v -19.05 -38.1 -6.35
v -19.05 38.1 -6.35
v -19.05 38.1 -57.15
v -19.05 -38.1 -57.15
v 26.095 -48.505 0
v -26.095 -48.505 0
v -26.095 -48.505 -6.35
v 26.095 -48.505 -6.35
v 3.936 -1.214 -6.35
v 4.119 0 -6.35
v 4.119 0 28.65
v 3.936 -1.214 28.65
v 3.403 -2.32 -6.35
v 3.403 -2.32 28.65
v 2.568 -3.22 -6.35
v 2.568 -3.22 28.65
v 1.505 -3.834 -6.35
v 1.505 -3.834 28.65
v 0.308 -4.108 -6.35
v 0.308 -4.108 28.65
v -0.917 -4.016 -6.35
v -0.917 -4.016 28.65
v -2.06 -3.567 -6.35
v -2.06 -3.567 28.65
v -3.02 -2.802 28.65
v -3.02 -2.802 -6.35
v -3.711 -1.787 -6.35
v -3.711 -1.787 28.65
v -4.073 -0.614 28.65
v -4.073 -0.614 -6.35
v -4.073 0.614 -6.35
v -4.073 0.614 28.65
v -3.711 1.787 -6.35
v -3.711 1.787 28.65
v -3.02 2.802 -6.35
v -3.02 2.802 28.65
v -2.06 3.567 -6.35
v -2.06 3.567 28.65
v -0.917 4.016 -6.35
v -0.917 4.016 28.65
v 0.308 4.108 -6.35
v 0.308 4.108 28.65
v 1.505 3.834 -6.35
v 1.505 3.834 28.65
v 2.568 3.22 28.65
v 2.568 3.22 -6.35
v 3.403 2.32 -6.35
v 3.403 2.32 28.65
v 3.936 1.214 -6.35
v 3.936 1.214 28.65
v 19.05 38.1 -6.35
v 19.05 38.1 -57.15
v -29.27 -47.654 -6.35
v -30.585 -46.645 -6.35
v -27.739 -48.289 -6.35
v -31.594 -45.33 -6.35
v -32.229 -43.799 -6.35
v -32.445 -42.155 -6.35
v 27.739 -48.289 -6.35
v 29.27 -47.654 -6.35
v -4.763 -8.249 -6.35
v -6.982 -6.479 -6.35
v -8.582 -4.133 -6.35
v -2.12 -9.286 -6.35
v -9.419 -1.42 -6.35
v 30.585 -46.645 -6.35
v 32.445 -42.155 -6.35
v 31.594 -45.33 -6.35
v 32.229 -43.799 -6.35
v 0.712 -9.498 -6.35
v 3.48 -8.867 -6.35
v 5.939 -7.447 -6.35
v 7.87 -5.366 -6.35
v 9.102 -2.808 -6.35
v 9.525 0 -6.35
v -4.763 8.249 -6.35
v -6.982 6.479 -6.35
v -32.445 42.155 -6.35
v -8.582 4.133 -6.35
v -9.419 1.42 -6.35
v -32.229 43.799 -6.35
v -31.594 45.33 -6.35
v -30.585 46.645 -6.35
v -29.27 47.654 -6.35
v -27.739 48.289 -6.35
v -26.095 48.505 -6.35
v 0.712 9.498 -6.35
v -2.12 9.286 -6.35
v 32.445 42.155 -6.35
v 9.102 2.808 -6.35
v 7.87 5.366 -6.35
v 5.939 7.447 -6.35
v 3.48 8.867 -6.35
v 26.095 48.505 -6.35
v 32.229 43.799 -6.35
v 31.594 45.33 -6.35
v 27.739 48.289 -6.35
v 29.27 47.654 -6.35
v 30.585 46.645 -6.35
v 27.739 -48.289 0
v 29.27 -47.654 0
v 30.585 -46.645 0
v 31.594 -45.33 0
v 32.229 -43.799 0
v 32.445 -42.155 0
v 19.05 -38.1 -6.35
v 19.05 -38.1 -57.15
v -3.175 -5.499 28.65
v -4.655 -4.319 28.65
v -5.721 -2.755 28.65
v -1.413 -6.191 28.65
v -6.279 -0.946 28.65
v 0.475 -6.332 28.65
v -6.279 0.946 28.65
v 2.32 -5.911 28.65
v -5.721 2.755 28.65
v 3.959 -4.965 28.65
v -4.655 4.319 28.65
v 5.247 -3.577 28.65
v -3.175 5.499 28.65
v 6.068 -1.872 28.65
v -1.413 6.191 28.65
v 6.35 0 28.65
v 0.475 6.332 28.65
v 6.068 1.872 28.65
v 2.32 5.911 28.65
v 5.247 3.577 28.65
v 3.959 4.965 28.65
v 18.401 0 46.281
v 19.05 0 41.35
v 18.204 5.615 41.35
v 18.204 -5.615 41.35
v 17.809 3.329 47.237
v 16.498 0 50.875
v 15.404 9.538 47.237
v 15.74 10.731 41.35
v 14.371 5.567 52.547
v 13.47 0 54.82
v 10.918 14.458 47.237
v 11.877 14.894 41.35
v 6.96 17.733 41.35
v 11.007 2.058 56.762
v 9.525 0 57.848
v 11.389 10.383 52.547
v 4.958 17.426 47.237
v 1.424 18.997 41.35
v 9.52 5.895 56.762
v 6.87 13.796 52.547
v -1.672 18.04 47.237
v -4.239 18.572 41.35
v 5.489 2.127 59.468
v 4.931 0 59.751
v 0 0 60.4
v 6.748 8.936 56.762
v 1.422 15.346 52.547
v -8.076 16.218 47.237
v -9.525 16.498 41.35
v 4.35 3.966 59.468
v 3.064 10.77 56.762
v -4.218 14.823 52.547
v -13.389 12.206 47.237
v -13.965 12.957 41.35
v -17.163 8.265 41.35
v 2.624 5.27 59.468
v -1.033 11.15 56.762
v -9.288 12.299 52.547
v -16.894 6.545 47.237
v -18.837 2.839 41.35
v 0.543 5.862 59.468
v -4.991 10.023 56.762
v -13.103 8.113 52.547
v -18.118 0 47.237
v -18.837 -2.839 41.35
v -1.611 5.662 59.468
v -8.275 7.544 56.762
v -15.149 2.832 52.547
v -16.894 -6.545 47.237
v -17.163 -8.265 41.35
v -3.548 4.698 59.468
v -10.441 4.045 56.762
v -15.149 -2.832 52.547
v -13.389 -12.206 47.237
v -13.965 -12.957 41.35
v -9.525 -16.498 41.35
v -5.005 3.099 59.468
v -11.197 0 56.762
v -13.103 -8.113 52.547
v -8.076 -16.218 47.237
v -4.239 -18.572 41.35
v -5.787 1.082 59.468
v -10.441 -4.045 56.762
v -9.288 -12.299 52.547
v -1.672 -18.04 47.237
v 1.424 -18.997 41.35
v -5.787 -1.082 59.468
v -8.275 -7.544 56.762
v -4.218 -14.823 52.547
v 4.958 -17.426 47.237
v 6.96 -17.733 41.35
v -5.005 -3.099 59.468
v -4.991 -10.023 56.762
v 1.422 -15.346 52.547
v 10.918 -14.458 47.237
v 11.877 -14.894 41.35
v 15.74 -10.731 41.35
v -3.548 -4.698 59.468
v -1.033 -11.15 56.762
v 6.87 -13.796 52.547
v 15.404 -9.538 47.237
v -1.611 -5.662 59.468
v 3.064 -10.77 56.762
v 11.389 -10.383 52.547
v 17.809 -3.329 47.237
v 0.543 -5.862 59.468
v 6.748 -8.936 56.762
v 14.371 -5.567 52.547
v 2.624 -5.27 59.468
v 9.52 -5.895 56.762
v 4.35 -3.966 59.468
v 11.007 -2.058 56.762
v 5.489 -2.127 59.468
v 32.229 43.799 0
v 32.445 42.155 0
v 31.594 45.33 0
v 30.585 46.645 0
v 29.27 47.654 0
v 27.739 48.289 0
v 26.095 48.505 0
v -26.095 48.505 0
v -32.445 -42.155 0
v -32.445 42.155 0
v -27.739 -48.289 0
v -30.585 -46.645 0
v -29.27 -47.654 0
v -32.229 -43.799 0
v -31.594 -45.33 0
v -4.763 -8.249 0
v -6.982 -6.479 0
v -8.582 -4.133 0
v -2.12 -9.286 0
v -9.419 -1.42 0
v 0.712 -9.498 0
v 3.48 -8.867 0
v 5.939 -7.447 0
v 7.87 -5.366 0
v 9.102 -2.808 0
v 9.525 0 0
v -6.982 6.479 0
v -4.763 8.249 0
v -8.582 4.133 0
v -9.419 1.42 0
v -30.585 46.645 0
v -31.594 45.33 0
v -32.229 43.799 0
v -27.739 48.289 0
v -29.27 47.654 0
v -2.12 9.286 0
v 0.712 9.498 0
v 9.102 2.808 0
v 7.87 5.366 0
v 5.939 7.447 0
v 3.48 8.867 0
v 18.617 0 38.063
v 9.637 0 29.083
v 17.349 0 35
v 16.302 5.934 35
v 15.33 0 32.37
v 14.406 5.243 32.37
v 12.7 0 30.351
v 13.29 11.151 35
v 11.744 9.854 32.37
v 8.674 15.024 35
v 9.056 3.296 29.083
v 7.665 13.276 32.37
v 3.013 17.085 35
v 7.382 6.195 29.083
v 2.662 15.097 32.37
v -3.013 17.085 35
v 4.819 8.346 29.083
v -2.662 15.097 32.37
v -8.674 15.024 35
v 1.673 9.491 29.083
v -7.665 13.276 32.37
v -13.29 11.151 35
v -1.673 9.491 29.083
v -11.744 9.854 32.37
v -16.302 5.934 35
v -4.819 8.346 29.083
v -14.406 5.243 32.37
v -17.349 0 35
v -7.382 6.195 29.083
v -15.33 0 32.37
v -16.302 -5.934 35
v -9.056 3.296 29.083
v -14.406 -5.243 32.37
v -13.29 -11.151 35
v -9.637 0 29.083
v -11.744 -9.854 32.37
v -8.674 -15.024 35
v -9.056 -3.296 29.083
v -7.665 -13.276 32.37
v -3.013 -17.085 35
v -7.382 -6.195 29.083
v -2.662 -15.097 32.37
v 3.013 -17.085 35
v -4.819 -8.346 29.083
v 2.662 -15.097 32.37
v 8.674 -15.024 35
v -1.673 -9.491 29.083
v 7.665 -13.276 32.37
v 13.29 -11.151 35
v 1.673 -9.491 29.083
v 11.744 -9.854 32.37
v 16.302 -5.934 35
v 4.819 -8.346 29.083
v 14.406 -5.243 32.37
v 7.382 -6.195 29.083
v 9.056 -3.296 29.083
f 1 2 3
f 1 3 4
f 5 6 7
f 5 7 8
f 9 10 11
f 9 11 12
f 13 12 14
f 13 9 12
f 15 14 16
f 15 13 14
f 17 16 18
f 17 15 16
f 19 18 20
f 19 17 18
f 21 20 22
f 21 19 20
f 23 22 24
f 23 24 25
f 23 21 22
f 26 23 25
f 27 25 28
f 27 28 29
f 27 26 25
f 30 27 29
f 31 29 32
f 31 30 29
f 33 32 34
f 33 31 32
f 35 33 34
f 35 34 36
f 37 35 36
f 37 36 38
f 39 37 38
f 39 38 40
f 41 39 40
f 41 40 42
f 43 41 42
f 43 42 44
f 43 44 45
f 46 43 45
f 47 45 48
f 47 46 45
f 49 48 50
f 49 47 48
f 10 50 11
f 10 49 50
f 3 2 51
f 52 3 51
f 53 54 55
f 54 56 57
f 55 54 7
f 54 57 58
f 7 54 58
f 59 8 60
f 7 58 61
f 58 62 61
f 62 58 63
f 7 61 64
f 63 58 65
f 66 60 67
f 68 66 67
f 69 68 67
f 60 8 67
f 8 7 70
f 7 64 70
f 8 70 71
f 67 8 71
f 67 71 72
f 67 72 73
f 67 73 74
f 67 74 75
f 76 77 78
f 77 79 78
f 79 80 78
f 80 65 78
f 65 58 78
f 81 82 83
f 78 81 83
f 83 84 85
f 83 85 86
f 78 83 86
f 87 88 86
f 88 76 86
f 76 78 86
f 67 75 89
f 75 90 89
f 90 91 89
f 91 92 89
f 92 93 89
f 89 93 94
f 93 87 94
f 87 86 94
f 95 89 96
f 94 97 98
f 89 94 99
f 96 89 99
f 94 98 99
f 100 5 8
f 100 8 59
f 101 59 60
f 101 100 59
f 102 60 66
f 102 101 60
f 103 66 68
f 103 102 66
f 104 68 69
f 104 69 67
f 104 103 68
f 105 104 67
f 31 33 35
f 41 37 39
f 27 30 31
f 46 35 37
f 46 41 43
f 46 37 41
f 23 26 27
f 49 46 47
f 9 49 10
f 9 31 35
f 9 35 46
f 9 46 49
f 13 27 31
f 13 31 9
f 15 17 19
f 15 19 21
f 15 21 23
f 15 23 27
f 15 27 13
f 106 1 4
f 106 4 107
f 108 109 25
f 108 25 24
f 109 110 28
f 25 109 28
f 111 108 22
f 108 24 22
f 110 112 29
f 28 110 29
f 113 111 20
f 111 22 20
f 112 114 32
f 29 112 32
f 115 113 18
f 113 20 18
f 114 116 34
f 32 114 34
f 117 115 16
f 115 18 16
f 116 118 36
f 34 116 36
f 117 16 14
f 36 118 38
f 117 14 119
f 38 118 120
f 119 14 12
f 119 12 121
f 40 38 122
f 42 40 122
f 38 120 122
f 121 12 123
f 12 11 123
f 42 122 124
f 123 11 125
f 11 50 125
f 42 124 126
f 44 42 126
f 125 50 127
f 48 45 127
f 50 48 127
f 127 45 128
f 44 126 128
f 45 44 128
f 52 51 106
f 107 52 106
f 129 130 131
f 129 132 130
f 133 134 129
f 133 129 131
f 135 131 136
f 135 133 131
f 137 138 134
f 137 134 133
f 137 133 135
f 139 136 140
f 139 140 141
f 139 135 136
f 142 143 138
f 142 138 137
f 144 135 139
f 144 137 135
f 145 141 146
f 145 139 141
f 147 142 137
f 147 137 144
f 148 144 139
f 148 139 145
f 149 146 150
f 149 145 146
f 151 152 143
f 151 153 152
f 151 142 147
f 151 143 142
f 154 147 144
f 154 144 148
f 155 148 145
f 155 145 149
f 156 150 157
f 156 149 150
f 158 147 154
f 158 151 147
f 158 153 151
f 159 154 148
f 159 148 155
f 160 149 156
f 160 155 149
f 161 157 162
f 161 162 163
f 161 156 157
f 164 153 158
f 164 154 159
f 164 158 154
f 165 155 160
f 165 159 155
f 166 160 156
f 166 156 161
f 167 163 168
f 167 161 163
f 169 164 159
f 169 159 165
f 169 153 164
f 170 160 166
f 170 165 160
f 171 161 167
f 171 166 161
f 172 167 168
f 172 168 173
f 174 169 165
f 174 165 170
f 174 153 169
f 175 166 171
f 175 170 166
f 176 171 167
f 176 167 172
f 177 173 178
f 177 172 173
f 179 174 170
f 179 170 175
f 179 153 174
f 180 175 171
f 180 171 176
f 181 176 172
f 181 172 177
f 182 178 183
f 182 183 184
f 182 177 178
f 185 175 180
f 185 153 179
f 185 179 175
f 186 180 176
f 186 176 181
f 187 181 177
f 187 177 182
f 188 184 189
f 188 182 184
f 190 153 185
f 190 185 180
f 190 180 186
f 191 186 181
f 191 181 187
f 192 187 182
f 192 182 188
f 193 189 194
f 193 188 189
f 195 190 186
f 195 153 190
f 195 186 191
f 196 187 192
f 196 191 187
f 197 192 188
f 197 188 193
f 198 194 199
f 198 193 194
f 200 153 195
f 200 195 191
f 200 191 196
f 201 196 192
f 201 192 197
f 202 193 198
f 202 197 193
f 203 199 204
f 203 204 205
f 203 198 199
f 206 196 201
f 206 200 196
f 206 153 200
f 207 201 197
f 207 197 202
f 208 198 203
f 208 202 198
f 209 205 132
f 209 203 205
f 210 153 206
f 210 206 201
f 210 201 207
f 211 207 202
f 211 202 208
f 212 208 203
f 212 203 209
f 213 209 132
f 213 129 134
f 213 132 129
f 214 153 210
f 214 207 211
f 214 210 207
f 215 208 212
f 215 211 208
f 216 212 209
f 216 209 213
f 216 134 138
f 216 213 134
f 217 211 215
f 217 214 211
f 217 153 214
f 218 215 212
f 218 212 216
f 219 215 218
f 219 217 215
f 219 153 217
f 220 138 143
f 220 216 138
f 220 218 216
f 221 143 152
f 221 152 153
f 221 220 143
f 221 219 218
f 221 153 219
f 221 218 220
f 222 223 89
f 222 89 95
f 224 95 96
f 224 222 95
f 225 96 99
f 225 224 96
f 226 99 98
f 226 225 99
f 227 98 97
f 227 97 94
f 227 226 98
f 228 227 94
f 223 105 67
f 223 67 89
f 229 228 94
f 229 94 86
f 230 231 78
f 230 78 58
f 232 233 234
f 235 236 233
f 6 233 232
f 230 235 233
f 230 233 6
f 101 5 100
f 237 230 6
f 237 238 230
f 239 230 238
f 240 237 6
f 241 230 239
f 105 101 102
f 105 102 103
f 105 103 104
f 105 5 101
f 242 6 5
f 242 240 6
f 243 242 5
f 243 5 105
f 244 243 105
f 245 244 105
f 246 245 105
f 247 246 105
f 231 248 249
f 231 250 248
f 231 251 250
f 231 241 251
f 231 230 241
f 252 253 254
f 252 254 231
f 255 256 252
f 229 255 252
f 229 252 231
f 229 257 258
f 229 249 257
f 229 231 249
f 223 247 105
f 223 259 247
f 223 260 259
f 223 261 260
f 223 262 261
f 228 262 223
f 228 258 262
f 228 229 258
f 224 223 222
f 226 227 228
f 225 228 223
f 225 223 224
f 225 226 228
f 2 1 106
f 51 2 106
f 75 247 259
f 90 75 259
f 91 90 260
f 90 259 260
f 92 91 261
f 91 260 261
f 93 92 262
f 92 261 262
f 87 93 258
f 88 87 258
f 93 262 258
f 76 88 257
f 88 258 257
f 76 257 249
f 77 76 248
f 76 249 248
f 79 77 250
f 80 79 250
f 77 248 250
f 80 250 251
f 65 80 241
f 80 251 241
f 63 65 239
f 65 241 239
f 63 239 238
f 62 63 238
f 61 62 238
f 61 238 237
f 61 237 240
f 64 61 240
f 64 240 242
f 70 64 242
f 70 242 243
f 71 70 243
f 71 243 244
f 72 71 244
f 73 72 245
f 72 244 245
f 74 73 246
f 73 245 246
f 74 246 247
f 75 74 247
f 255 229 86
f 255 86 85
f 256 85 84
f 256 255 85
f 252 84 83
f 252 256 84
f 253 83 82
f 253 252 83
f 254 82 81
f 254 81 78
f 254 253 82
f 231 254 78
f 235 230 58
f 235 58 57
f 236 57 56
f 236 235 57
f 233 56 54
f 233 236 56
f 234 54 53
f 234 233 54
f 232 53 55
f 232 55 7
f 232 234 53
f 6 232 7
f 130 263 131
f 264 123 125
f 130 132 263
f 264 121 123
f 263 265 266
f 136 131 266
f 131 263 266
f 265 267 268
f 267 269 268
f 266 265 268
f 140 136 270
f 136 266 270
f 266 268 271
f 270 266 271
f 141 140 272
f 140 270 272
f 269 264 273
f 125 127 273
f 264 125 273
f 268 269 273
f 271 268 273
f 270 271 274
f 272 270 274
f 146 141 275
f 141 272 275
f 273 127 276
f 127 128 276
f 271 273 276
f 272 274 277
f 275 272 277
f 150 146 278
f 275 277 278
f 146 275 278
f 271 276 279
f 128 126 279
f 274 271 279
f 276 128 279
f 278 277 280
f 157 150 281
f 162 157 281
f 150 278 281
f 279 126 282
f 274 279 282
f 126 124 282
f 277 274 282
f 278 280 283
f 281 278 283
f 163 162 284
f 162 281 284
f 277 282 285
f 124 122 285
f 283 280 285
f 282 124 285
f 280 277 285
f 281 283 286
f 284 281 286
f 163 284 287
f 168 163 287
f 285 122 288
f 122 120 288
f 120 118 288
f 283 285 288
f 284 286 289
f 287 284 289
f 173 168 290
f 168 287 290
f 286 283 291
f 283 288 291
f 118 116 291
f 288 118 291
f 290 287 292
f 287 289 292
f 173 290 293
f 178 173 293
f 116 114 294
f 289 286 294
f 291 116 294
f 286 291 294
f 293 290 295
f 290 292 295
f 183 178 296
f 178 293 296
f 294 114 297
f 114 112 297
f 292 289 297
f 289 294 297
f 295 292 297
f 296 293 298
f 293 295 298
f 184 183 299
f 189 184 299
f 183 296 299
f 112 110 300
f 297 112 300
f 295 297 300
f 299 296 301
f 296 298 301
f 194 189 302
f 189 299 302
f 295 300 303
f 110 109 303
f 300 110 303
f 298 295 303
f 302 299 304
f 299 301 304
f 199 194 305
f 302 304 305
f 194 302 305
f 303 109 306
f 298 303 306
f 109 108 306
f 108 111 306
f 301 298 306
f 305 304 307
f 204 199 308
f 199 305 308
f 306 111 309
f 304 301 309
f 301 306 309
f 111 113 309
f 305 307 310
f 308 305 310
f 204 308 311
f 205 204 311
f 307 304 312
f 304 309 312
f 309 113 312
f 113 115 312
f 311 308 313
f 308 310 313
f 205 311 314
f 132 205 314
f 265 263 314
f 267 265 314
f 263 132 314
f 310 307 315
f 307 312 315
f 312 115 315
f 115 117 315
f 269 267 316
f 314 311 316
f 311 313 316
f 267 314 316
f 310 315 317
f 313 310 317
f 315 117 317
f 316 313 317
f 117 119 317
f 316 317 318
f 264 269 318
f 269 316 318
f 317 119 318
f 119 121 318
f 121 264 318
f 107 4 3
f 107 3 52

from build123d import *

# Parameters (mm, degrees)
F0_R     = 9.525
F1_DEPTH = 6.35
F2_R     = 4.1191118401
F3_DEPTH = 35
F4_R     = 19.05
F5_DEPTH = 31.75
F6_R     = 19.05
F7_R     = 12.69999
F8_W     = 38.1
F8_H     = 76.2
F8_R     = 9.525
F9_DEPTH = 50.8


# Not quite as in the source:
# - a fillet or chamfer is up to 0.001 mm smaller than in the source, because OpenCascade refuses the exact size


with BuildPart() as f1:
    # F0 (on Top) → F1 (new body)
    with BuildSketch(Plane.XY):
        with BuildLine():
            Line((26.095, 48.505), (-26.095, 48.505))
            ThreePointArc((-26.095, 48.505), (-30.5851280605, 46.6451280605), (-32.445, 42.155))
            Line((-32.445, 42.155), (-32.445, -42.155))
            ThreePointArc((-32.445, -42.155), (-30.5851280605, -46.6451280605), (-26.095, -48.505))
            Line((-26.095, -48.505), (26.095, -48.505))
            ThreePointArc((26.095, -48.505), (30.5851280605, -46.6451280605), (32.445, -42.155))
            Line((32.445, -42.155), (32.445, 42.155))
            ThreePointArc((32.445, 42.155), (30.5851280605, 46.6451280605), (26.095, 48.505))
        make_face()
        Circle(F0_R, mode=Mode.SUBTRACT)
    extrude(amount=-F1_DEPTH)


with BuildPart() as f3:
    # F2 (on face) → F3 (new body)
    with BuildSketch(Plane(origin=(0, 0, -6.35), x_dir=(1, 0, 0), z_dir=(0, 0, -1))):
        Circle(F2_R)
    extrude(amount=-F3_DEPTH)

    # F4 (on face) → F5 (join)
    with BuildSketch(Plane.XY.offset(28.65)):
        Circle(F4_R)
    extrude(amount=F5_DEPTH)

    # F6
    f6_edges = [f3.edges().sort_by_distance(p)[0] for p in [
        (-19.05, 0, 60.4),
    ]]
    fillet(f6_edges, radius=F6_R)

    # F7 (radius 12.7 in the source; OpenCascade refuses exactly that, so slightly less here)
    f7_edges = [f3.edges().sort_by_distance(p)[0] for p in [
        (-19.05, 0, 28.65),
    ]]
    fillet(f7_edges, radius=F7_R)


with BuildPart() as f9:
    # F8 (on face) → F9 (new body)
    with BuildSketch(Plane(origin=(0, 0, -6.35), x_dir=(1, 0, 0), z_dir=(0, 0, -1))):
        Rectangle(F8_W, F8_H)
        Circle(F8_R, mode=Mode.SUBTRACT)
        Circle(F8_R)
    extrude(amount=F9_DEPTH)


solid = Compound([f1.part, f3.part, f9.part])
